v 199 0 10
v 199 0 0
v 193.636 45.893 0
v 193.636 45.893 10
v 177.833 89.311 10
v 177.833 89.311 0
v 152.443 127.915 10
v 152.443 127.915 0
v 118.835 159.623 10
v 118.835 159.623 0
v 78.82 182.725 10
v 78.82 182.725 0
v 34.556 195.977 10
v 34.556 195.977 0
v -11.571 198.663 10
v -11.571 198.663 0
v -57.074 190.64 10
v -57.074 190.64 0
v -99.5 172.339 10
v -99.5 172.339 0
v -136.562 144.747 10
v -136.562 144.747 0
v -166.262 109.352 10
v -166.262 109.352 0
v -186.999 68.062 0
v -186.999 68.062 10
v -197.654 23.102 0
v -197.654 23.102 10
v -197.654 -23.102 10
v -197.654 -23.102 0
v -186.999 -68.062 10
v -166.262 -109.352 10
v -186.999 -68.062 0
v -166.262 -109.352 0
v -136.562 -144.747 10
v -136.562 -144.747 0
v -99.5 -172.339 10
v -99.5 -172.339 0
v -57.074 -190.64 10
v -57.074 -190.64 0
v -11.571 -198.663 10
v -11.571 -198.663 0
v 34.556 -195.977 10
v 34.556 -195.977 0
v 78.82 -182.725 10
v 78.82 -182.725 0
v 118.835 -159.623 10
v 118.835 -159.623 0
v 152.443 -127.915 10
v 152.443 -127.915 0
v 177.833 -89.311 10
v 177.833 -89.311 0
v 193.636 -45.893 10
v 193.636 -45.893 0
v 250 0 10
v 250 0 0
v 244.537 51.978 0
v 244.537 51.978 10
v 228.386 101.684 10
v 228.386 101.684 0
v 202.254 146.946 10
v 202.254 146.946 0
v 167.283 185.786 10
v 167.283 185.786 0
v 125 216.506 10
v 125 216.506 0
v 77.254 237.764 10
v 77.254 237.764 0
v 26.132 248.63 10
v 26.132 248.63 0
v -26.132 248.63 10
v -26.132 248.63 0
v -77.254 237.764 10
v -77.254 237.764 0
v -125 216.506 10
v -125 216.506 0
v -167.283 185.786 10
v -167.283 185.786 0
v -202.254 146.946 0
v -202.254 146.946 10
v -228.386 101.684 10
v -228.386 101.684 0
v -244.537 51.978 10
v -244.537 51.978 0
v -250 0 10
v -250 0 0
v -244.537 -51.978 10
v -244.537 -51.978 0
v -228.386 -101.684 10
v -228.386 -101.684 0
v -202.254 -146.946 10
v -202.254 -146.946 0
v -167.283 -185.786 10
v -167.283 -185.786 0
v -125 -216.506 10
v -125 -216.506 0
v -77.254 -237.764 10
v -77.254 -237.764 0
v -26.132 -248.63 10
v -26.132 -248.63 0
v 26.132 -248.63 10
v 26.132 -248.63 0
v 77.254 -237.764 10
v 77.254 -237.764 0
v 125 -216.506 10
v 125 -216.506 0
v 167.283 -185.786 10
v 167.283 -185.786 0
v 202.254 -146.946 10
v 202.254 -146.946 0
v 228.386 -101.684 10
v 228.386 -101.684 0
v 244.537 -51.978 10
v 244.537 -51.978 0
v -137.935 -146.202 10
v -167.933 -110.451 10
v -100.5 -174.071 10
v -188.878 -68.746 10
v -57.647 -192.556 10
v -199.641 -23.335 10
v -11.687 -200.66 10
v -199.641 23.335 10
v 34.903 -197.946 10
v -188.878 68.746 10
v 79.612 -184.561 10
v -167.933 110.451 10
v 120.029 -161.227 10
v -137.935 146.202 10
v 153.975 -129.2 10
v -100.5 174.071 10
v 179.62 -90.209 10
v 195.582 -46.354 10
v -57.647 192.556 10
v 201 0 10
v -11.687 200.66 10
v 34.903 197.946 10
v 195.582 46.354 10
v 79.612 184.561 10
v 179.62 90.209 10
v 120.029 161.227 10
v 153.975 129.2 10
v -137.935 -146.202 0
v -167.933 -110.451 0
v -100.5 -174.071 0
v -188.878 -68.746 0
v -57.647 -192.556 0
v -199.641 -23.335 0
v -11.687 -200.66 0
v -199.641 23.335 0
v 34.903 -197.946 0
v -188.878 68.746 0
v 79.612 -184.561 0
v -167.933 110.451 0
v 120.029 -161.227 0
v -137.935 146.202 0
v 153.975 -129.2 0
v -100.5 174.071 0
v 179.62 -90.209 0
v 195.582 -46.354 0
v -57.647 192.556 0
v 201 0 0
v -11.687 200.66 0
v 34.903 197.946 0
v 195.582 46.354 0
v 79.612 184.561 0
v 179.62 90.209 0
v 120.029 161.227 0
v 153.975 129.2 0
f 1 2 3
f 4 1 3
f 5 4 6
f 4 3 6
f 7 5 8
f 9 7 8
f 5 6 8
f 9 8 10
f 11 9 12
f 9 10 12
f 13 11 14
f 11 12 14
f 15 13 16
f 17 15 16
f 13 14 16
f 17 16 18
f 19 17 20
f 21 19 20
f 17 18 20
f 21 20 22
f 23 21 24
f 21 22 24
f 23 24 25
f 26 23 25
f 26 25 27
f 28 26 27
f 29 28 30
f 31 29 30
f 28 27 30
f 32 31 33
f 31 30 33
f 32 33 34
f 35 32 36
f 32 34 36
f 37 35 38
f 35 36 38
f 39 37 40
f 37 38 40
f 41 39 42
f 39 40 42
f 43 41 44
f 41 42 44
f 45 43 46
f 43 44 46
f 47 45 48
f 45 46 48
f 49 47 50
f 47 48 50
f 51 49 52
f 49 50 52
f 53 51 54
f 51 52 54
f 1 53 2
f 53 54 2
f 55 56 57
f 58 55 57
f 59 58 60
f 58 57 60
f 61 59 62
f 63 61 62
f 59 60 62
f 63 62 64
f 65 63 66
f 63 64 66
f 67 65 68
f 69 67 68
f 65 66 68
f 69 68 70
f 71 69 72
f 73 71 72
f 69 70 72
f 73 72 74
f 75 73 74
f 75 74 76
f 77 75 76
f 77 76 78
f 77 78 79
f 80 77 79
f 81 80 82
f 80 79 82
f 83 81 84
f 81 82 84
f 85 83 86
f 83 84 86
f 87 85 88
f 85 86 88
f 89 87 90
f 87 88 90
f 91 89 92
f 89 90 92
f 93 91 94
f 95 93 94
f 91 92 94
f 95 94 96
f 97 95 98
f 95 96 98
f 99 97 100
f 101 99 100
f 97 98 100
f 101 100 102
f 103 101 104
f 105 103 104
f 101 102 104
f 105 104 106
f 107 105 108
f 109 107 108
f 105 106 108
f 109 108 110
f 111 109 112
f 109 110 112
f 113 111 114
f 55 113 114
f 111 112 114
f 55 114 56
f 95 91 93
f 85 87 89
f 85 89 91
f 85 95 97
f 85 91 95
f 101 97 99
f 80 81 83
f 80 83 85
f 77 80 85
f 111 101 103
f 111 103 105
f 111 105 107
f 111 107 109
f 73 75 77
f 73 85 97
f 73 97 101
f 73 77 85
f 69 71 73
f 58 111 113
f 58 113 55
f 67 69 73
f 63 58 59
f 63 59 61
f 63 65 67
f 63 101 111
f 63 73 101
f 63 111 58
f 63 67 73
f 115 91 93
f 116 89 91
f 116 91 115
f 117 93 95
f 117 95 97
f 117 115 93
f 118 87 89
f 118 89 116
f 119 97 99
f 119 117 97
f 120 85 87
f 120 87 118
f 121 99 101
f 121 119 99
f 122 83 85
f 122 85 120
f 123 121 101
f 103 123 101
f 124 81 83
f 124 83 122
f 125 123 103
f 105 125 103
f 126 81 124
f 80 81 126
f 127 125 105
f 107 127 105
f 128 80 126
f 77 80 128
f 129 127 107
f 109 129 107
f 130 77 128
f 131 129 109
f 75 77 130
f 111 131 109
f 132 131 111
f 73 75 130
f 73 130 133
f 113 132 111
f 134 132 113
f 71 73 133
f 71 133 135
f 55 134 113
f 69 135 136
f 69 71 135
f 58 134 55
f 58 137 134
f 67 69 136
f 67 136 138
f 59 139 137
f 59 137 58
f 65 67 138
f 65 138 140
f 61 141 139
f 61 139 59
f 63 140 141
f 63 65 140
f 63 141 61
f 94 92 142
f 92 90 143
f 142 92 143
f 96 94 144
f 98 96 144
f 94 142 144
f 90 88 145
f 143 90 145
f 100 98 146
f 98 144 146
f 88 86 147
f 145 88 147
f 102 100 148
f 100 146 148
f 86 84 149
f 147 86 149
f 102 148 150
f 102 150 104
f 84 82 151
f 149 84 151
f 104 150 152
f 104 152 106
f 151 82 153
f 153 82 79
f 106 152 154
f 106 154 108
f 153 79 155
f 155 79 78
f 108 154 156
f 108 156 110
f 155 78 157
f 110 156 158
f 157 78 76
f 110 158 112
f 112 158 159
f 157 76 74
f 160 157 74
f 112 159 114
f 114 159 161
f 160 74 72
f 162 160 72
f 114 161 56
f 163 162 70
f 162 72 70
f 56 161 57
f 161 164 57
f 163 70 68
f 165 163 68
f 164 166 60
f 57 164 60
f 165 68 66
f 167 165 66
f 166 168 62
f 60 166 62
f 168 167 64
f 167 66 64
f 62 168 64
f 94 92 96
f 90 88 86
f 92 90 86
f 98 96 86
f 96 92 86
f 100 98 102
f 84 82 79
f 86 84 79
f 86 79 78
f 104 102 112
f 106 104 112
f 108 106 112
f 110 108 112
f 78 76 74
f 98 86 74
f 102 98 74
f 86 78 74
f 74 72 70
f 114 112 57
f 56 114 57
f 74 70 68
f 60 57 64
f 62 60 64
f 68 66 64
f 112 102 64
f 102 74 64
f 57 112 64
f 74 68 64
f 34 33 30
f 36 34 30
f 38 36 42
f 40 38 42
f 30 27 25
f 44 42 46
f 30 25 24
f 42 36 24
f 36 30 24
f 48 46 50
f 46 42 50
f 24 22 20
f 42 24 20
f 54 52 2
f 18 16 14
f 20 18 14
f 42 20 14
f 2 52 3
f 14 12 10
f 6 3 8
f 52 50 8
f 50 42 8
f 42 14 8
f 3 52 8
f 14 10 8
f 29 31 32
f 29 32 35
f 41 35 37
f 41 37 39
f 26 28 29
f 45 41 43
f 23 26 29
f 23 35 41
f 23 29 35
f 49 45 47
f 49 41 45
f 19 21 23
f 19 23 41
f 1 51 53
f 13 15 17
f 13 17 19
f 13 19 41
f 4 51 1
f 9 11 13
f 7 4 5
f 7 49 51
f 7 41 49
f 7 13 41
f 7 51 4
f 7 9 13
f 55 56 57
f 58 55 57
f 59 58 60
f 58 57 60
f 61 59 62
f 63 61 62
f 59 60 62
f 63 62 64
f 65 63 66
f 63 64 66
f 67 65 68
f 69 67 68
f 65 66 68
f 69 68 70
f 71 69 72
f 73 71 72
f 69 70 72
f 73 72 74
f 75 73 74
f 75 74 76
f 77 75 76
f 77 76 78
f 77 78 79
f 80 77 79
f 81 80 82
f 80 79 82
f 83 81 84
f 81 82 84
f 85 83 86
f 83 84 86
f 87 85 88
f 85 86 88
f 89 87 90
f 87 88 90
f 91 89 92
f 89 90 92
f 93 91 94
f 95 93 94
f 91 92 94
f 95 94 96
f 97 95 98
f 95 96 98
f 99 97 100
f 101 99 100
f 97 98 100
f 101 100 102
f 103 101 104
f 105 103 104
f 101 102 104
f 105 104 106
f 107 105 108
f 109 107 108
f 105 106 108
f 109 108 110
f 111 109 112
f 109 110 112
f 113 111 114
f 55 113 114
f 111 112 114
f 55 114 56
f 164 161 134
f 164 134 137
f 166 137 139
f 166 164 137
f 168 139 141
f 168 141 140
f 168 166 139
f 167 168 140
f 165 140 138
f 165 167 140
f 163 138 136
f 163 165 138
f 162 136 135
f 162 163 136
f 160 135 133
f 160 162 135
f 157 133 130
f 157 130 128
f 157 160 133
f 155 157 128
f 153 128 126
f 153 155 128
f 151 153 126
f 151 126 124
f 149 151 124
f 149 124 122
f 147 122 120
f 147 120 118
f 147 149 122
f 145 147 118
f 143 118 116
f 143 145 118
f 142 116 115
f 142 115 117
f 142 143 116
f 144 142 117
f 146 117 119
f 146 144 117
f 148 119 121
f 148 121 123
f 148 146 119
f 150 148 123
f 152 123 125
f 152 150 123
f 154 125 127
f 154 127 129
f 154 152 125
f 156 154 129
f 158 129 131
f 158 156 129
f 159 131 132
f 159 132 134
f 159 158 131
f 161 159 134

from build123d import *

# Parameters (mm, degrees)
CYLINDER_R        = 199
CYLINDER_DEPTH    = 10
TUBE_R            = 250
TUBE_R_2          = 201
TUBE_DEPTH        = 10
CYLINDER001_R     = 250
CYLINDER001_DEPTH = 10


with BuildPart() as inner:
    # Cylinder → Cylinder (new body)
    with BuildSketch(Plane.XY):
        Circle(CYLINDER_R)
    extrude(amount=CYLINDER_DEPTH)


with BuildPart() as outer:
    # Tube → Tube (new body)
    with BuildSketch(Plane.XY):
        Circle(TUBE_R)
        Circle(TUBE_R_2, mode=Mode.SUBTRACT)
    extrude(amount=TUBE_DEPTH)


with BuildPart() as full:
    # Cylinder001 → Cylinder001 (new body)
    with BuildSketch(Plane.XY):
        Circle(CYLINDER001_R)
    extrude(amount=CYLINDER001_DEPTH)


solid = Compound([inner.part, outer.part, full.part])
